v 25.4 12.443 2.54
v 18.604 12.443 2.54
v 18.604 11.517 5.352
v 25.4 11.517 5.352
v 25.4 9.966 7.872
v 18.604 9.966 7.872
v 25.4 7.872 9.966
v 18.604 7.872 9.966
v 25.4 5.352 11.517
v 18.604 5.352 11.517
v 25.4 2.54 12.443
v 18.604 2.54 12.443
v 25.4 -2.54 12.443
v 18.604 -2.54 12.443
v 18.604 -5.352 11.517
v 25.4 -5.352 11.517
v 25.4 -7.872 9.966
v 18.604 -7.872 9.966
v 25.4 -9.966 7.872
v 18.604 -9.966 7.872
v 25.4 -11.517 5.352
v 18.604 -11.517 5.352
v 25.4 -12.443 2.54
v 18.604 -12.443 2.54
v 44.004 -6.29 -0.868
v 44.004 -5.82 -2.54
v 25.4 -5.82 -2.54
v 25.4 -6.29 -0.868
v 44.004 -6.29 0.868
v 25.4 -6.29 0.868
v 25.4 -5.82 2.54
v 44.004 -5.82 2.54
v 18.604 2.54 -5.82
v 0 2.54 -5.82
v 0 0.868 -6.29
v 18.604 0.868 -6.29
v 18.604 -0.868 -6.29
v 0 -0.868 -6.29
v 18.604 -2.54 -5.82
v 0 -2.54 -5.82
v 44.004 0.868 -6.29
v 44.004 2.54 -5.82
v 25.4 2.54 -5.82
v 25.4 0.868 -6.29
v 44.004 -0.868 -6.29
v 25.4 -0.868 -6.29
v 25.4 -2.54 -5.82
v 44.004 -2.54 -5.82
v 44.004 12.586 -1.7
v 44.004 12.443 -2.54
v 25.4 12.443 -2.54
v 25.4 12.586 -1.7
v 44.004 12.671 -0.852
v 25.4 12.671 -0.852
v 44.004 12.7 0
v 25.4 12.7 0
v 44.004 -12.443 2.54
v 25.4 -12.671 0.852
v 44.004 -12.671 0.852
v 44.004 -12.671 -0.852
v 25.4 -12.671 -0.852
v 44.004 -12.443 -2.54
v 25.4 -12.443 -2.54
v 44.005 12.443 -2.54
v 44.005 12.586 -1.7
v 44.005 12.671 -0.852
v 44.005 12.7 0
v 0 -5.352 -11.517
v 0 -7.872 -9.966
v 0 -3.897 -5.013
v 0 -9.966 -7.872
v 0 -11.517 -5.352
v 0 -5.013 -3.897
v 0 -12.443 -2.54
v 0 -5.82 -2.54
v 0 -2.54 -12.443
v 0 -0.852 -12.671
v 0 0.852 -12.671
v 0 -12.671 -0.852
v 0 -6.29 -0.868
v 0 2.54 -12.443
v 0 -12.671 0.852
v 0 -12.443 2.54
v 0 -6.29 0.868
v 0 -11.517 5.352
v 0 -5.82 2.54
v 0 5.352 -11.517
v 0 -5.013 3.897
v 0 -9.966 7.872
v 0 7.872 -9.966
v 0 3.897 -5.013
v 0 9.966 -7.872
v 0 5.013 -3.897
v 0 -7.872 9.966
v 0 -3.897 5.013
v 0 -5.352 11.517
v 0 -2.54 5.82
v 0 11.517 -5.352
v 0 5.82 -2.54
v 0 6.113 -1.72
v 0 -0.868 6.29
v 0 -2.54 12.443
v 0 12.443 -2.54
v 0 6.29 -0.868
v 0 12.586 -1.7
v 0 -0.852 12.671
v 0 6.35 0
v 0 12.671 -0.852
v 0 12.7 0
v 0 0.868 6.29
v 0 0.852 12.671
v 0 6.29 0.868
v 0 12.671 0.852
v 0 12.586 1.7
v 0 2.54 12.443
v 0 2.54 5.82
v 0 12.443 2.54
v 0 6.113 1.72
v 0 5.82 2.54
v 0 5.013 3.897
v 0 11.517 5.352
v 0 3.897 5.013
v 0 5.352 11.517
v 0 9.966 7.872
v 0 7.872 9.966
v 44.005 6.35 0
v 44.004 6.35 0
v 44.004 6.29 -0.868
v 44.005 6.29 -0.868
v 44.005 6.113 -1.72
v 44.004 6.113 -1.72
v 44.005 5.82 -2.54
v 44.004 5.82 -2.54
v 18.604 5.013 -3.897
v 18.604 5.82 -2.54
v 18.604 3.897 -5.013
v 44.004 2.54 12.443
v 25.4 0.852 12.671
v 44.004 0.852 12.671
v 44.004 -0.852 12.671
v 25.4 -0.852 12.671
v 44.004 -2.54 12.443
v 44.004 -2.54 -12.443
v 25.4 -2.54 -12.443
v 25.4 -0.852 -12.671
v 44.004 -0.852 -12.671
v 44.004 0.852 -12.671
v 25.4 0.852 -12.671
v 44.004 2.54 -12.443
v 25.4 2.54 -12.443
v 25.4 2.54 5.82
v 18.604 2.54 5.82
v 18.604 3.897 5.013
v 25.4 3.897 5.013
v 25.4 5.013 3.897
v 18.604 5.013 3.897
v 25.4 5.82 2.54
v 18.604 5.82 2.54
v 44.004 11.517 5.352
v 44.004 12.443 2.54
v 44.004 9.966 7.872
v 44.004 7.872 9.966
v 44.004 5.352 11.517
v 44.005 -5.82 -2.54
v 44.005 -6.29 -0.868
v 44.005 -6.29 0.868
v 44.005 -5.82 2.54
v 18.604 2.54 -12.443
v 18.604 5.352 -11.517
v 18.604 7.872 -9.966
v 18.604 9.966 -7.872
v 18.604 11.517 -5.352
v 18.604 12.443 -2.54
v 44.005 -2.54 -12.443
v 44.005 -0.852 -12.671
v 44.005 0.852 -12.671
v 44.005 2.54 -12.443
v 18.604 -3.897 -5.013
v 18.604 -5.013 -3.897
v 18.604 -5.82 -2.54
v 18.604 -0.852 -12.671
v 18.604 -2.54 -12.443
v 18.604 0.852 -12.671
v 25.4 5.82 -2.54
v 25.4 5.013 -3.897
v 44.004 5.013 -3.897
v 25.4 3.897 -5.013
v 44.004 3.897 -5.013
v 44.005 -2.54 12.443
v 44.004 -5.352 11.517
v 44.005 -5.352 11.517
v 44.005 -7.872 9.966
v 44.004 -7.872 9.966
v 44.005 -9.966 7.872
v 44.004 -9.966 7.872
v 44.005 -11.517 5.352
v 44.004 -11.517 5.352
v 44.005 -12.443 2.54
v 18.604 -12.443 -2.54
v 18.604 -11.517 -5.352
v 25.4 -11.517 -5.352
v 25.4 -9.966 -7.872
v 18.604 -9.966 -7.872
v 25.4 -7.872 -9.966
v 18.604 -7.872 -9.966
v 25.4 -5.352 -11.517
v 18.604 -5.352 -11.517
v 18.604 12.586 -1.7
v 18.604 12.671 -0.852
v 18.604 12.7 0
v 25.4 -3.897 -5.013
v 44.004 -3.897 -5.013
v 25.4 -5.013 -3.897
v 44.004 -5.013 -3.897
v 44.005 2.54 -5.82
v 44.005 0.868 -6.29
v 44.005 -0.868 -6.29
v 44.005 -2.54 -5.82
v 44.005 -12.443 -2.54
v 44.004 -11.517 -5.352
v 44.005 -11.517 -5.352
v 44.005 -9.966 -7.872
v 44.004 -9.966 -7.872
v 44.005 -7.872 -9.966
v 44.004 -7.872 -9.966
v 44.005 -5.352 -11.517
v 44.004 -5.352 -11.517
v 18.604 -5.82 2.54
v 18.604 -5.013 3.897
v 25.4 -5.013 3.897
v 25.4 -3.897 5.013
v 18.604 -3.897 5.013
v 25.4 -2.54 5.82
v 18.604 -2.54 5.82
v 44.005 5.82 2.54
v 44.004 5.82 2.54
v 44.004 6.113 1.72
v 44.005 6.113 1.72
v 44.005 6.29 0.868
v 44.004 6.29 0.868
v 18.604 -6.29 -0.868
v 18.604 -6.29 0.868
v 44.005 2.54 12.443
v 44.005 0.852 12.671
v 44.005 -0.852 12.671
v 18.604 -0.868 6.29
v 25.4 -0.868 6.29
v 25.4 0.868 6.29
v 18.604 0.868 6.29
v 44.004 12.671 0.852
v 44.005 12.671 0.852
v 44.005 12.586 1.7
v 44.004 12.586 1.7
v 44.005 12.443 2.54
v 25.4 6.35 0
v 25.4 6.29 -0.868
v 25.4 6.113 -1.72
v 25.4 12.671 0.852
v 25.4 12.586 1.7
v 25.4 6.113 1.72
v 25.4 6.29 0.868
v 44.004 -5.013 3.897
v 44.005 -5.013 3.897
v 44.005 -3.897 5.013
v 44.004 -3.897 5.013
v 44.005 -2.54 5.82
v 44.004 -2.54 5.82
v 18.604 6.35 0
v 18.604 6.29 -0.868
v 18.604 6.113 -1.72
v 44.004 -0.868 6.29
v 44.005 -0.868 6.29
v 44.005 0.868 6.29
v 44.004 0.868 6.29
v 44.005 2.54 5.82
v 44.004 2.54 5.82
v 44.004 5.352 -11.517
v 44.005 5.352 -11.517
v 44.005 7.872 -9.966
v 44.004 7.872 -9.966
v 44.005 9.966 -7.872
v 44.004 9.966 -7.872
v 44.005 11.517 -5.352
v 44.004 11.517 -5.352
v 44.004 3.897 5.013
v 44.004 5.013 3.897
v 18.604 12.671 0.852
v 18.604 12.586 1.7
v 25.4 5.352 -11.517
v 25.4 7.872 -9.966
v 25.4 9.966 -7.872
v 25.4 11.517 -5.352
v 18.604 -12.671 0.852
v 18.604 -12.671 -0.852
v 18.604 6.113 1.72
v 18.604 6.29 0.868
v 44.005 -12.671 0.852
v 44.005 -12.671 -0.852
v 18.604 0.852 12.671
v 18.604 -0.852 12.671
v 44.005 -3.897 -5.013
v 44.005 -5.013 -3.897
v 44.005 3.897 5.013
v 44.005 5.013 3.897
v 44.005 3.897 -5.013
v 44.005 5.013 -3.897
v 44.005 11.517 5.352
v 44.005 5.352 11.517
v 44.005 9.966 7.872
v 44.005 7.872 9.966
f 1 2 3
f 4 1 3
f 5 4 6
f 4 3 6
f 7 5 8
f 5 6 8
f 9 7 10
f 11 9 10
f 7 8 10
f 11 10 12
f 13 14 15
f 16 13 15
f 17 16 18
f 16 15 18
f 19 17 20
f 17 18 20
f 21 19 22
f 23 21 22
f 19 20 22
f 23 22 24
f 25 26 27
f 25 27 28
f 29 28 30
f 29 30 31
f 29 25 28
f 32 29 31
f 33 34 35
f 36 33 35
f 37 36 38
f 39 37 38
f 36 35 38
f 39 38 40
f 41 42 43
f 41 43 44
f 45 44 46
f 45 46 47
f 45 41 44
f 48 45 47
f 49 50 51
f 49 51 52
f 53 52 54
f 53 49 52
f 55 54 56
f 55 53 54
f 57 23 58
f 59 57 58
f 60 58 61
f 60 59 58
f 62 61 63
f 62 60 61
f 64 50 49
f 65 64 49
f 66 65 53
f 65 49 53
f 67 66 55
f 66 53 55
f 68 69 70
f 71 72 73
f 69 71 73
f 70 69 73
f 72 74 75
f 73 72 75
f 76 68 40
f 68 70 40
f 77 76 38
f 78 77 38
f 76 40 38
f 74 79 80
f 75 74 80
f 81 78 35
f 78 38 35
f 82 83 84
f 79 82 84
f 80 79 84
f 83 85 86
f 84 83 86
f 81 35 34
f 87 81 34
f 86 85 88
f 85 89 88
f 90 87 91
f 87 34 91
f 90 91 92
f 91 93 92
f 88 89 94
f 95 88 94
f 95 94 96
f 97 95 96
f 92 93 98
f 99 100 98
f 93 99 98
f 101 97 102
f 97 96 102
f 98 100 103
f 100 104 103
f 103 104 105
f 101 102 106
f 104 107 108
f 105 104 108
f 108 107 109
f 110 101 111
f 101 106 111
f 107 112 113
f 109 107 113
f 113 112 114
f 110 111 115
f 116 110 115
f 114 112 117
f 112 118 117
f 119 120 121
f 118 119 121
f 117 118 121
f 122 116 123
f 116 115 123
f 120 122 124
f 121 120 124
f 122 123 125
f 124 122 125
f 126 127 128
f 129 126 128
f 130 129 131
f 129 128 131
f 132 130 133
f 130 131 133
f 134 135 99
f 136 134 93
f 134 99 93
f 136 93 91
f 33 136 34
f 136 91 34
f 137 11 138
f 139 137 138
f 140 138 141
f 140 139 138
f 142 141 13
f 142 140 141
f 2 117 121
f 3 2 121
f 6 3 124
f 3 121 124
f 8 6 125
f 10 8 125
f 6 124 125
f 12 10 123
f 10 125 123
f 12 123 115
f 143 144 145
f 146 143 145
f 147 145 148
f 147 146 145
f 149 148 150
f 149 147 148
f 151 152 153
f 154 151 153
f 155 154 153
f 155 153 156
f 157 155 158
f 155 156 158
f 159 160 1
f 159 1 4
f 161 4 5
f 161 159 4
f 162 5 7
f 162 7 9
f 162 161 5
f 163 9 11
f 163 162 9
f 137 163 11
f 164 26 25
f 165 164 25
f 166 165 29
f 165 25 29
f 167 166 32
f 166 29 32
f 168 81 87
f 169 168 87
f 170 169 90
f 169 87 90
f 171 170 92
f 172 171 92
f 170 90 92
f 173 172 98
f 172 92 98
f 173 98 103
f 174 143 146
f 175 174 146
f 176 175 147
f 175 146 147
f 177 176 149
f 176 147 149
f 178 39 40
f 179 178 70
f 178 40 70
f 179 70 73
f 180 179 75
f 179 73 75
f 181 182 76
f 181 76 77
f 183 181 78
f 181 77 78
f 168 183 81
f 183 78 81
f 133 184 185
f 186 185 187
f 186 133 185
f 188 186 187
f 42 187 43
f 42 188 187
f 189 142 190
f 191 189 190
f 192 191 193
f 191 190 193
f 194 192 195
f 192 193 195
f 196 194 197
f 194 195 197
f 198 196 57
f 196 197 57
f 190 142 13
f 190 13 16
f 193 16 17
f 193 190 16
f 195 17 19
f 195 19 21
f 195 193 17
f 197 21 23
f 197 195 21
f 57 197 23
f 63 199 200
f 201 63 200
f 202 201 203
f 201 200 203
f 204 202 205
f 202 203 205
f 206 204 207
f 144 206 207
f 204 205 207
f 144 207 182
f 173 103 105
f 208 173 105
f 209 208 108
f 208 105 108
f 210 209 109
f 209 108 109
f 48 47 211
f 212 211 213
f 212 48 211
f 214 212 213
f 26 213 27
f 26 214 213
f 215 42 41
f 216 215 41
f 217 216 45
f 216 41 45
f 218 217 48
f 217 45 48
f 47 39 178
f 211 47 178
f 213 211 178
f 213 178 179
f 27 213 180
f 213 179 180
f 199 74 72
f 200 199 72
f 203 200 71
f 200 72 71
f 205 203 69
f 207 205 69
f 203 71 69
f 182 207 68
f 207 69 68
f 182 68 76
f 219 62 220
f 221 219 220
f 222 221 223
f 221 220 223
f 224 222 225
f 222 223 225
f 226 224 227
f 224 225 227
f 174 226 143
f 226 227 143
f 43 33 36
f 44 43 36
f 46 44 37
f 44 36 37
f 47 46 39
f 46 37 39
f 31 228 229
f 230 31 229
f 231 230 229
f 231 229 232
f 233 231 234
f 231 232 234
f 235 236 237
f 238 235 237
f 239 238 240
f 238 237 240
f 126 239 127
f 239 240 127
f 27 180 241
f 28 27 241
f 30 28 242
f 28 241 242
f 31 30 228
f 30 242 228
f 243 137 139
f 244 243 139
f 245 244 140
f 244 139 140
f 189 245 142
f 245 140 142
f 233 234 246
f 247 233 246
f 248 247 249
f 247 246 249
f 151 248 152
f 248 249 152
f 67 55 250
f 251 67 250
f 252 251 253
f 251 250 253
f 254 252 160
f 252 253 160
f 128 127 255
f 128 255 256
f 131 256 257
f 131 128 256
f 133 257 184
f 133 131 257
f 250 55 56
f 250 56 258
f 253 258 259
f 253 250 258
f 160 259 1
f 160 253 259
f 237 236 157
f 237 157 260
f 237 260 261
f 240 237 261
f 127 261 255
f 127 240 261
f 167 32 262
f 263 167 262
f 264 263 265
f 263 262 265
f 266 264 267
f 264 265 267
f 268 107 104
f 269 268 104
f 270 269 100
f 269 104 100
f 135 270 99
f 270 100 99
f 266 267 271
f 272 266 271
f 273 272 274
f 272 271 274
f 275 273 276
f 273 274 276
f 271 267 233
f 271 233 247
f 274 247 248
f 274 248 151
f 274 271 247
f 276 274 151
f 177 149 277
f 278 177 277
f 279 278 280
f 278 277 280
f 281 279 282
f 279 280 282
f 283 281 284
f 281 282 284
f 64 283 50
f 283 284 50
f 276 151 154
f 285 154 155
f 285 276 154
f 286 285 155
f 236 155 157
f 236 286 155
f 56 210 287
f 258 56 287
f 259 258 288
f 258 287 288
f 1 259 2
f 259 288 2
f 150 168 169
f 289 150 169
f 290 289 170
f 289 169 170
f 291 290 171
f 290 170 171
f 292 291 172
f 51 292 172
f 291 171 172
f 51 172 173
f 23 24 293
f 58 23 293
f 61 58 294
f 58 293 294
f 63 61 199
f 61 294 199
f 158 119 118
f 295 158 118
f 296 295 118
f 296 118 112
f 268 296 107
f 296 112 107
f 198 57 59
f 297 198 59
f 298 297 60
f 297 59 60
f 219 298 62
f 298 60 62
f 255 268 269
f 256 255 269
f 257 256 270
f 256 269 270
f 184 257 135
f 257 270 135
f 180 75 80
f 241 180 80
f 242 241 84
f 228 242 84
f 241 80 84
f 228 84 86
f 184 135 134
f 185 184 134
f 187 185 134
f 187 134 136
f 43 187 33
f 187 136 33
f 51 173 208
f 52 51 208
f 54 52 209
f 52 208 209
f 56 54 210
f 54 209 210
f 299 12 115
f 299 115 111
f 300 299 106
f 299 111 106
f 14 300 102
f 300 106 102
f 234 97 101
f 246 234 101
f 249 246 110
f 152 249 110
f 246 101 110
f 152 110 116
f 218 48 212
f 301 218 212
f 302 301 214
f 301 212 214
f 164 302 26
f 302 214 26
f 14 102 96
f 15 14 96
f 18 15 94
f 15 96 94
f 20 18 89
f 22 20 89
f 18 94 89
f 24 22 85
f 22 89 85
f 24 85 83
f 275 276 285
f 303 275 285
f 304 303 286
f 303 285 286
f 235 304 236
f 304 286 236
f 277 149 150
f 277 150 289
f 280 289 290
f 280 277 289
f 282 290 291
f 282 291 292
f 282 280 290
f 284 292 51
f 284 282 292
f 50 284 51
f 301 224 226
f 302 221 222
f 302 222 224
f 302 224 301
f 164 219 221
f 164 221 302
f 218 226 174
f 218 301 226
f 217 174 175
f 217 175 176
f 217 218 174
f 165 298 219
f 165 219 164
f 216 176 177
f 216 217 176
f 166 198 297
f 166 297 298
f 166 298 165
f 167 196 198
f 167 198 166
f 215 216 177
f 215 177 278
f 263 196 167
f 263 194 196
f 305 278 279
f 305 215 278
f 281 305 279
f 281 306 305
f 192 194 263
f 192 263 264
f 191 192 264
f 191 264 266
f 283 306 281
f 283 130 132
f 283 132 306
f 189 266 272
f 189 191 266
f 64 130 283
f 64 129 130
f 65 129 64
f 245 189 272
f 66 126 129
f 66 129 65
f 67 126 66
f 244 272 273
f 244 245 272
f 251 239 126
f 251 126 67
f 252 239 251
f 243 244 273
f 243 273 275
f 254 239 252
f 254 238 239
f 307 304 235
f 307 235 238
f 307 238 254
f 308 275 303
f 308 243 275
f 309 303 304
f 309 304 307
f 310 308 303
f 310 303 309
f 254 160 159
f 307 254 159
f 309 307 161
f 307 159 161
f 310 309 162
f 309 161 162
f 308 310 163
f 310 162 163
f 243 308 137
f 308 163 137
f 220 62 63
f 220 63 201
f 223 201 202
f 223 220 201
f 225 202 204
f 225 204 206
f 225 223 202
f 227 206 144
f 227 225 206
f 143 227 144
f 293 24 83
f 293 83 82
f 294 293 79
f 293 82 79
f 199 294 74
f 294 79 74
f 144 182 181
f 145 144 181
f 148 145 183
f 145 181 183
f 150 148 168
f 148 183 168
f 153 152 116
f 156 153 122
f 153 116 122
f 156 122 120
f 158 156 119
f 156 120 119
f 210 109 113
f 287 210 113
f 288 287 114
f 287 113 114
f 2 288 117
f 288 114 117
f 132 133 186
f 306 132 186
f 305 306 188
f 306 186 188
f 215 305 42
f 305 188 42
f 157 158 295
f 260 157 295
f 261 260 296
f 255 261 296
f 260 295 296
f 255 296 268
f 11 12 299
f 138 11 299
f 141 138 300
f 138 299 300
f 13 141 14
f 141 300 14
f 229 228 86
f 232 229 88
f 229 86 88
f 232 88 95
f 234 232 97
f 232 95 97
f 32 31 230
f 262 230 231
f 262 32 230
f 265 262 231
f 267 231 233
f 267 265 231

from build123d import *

# Parameters (mm, degrees)
F1_DEPTH = 25.4
F2_DEPTH = 44.00509


# Not quite as in the source:
# - a pattern or mirror of a feature is missing from the dataset's text; its kind, count and spacing are read off the source's solid
# - a feature names something its author has since deleted; it is built from what else it names


with BuildPart() as f1:
    # F0 (on Right) → F1 (new body)
    with BuildSketch(Plane.YZ):
        with BuildLine():
            ThreePointArc((12.4434078933, -2.54), (12.6356891432, -1.2764638175), (12.7, 0))
            ThreePointArc((12.7, 0), (12.6356891432, 1.2764638175), (12.4434078933, 2.54))
            Line((12.4434078933, 2.54), (5.8198711326, 2.54))
            ThreePointArc((5.8198711326, 2.54), (6.2160550871, 1.2973662374), (6.35, 0))
            ThreePointArc((6.35, 0), (6.2160550871, -1.2973662374), (5.8198711326, -2.54))
            Line((5.8198711326, -2.54), (12.4434078933, -2.54))
        make_face()
        with BuildLine():
            Line((5.8198711326, 2.54), (12.4434078933, 2.54))
            ThreePointArc((12.4434078933, 2.54), (8.9802561211, 8.9802561211), (2.54, 12.4434078933))
            Line((2.54, 12.4434078933), (2.54, 5.8198711326))
            ThreePointArc((2.54, 5.8198711326), (4.4901280605, 4.4901280605), (5.8198711326, 2.54))
        make_face()
        with BuildLine():
            ThreePointArc((2.54, -12.4434078933), (8.9802561211, -8.9802561211), (12.4434078933, -2.54))
            Line((12.4434078933, -2.54), (5.8198711326, -2.54))
            ThreePointArc((5.8198711326, -2.54), (4.4901280605, -4.4901280605), (2.54, -5.8198711326))
            Line((2.54, -5.8198711326), (2.54, -12.4434078933))
        make_face()
        with BuildLine():
            Line((2.54, 5.8198711326), (2.54, 12.4434078933))
            ThreePointArc((2.54, 12.4434078933), (0, 12.7), (-2.54, 12.4434078933))
            Line((-2.54, 12.4434078933), (-2.54, 5.8198711326))
            ThreePointArc((-2.54, 5.8198711326), (0, 6.35), (2.54, 5.8198711326))
        make_face()
        with BuildLine():
            ThreePointArc((-2.54, -12.4434078933), (0, -12.7), (2.54, -12.4434078933))
            Line((2.54, -12.4434078933), (2.54, -5.8198711326))
            ThreePointArc((2.54, -5.8198711326), (0, -6.35), (-2.54, -5.8198711326))
            Line((-2.54, -5.8198711326), (-2.54, -12.4434078933))
        make_face()
        with BuildLine():
            Line((-2.54, 5.8198711326), (-2.54, 12.4434078933))
            ThreePointArc((-2.54, 12.4434078933), (-8.9802561211, 8.9802561211), (-12.4434078933, 2.54))
            Line((-12.4434078933, 2.54), (-5.8198711326, 2.54))
            ThreePointArc((-5.8198711326, 2.54), (-4.4901280605, 4.4901280605), (-2.54, 5.8198711326))
        make_face()
        with BuildLine():
            ThreePointArc((-12.4434078933, -2.54), (-8.9802561211, -8.9802561211), (-2.54, -12.4434078933))
            Line((-2.54, -12.4434078933), (-2.54, -5.8198711326))
            ThreePointArc((-2.54, -5.8198711326), (-4.4901280605, -4.4901280605), (-5.8198711326, -2.54))
            Line((-5.8198711326, -2.54), (-12.4434078933, -2.54))
        make_face()
        with BuildLine():
            Line((-5.8198711326, 2.54), (-12.4434078933, 2.54))
            ThreePointArc((-12.4434078933, 2.54), (-12.7, 0), (-12.4434078933, -2.54))
            Line((-12.4434078933, -2.54), (-5.8198711326, -2.54))
            ThreePointArc((-5.8198711326, -2.54), (-6.35, 0), (-5.8198711326, 2.54))
        make_face()
    extrude(amount=F1_DEPTH)

    # F1_copies: F1 across plane


with BuildPart() as f1_1:
    add(f1.part)
    add(f1.part.mirror(Plane(origin=(22.002045, 0, 0), x_dir=(0, 0, 1), z_dir=(1, 0, 0))))

    # F0 (on Right) → F2 (join, through all)
    with BuildSketch(Plane.YZ):
        with BuildLine():
            ThreePointArc((12.4434078933, -2.54), (12.6356891432, -1.2764638175), (12.7, 0))
            ThreePointArc((12.7, 0), (12.6356891432, 1.2764638175), (12.4434078933, 2.54))
            Line((12.4434078933, 2.54), (5.8198711326, 2.54))
            ThreePointArc((5.8198711326, 2.54), (6.2160550871, 1.2973662374), (6.35, 0))
            ThreePointArc((6.35, 0), (6.2160550871, -1.2973662374), (5.8198711326, -2.54))
            Line((5.8198711326, -2.54), (12.4434078933, -2.54))
        make_face()
        with BuildLine():
            Line((5.8198711326, 2.54), (12.4434078933, 2.54))
            ThreePointArc((12.4434078933, 2.54), (8.9802561211, 8.9802561211), (2.54, 12.4434078933))
            Line((2.54, 12.4434078933), (2.54, 5.8198711326))
            ThreePointArc((2.54, 5.8198711326), (4.4901280605, 4.4901280605), (5.8198711326, 2.54))
        make_face()
        with BuildLine():
            ThreePointArc((2.54, -12.4434078933), (8.9802561211, -8.9802561211), (12.4434078933, -2.54))
            Line((12.4434078933, -2.54), (5.8198711326, -2.54))
            ThreePointArc((5.8198711326, -2.54), (4.4901280605, -4.4901280605), (2.54, -5.8198711326))
            Line((2.54, -5.8198711326), (2.54, -12.4434078933))
        make_face()
        with BuildLine():
            Line((2.54, 5.8198711326), (2.54, 12.4434078933))
            ThreePointArc((2.54, 12.4434078933), (0, 12.7), (-2.54, 12.4434078933))
            Line((-2.54, 12.4434078933), (-2.54, 5.8198711326))
            ThreePointArc((-2.54, 5.8198711326), (0, 6.35), (2.54, 5.8198711326))
        make_face()
        with BuildLine():
            ThreePointArc((-2.54, -12.4434078933), (0, -12.7), (2.54, -12.4434078933))
            Line((2.54, -12.4434078933), (2.54, -5.8198711326))
            ThreePointArc((2.54, -5.8198711326), (0, -6.35), (-2.54, -5.8198711326))
            Line((-2.54, -5.8198711326), (-2.54, -12.4434078933))
        make_face()
        with BuildLine():
            Line((-2.54, 5.8198711326), (-2.54, 12.4434078933))
            ThreePointArc((-2.54, 12.4434078933), (-8.9802561211, 8.9802561211), (-12.4434078933, 2.54))
            Line((-12.4434078933, 2.54), (-5.8198711326, 2.54))
            ThreePointArc((-5.8198711326, 2.54), (-4.4901280605, 4.4901280605), (-2.54, 5.8198711326))
        make_face()
        with BuildLine():
            ThreePointArc((-12.4434078933, -2.54), (-8.9802561211, -8.9802561211), (-2.54, -12.4434078933))
            Line((-2.54, -12.4434078933), (-2.54, -5.8198711326))
            ThreePointArc((-2.54, -5.8198711326), (-4.4901280605, -4.4901280605), (-5.8198711326, -2.54))
            Line((-5.8198711326, -2.54), (-12.4434078933, -2.54))
        make_face()
        with BuildLine():
            Line((-5.8198711326, 2.54), (-12.4434078933, 2.54))
            ThreePointArc((-12.4434078933, 2.54), (-12.7, 0), (-12.4434078933, -2.54))
            Line((-12.4434078933, -2.54), (-5.8198711326, -2.54))
            ThreePointArc((-5.8198711326, -2.54), (-6.35, 0), (-5.8198711326, 2.54))
        make_face()
    extrude(amount=F2_DEPTH)


solid = f1_1.part
